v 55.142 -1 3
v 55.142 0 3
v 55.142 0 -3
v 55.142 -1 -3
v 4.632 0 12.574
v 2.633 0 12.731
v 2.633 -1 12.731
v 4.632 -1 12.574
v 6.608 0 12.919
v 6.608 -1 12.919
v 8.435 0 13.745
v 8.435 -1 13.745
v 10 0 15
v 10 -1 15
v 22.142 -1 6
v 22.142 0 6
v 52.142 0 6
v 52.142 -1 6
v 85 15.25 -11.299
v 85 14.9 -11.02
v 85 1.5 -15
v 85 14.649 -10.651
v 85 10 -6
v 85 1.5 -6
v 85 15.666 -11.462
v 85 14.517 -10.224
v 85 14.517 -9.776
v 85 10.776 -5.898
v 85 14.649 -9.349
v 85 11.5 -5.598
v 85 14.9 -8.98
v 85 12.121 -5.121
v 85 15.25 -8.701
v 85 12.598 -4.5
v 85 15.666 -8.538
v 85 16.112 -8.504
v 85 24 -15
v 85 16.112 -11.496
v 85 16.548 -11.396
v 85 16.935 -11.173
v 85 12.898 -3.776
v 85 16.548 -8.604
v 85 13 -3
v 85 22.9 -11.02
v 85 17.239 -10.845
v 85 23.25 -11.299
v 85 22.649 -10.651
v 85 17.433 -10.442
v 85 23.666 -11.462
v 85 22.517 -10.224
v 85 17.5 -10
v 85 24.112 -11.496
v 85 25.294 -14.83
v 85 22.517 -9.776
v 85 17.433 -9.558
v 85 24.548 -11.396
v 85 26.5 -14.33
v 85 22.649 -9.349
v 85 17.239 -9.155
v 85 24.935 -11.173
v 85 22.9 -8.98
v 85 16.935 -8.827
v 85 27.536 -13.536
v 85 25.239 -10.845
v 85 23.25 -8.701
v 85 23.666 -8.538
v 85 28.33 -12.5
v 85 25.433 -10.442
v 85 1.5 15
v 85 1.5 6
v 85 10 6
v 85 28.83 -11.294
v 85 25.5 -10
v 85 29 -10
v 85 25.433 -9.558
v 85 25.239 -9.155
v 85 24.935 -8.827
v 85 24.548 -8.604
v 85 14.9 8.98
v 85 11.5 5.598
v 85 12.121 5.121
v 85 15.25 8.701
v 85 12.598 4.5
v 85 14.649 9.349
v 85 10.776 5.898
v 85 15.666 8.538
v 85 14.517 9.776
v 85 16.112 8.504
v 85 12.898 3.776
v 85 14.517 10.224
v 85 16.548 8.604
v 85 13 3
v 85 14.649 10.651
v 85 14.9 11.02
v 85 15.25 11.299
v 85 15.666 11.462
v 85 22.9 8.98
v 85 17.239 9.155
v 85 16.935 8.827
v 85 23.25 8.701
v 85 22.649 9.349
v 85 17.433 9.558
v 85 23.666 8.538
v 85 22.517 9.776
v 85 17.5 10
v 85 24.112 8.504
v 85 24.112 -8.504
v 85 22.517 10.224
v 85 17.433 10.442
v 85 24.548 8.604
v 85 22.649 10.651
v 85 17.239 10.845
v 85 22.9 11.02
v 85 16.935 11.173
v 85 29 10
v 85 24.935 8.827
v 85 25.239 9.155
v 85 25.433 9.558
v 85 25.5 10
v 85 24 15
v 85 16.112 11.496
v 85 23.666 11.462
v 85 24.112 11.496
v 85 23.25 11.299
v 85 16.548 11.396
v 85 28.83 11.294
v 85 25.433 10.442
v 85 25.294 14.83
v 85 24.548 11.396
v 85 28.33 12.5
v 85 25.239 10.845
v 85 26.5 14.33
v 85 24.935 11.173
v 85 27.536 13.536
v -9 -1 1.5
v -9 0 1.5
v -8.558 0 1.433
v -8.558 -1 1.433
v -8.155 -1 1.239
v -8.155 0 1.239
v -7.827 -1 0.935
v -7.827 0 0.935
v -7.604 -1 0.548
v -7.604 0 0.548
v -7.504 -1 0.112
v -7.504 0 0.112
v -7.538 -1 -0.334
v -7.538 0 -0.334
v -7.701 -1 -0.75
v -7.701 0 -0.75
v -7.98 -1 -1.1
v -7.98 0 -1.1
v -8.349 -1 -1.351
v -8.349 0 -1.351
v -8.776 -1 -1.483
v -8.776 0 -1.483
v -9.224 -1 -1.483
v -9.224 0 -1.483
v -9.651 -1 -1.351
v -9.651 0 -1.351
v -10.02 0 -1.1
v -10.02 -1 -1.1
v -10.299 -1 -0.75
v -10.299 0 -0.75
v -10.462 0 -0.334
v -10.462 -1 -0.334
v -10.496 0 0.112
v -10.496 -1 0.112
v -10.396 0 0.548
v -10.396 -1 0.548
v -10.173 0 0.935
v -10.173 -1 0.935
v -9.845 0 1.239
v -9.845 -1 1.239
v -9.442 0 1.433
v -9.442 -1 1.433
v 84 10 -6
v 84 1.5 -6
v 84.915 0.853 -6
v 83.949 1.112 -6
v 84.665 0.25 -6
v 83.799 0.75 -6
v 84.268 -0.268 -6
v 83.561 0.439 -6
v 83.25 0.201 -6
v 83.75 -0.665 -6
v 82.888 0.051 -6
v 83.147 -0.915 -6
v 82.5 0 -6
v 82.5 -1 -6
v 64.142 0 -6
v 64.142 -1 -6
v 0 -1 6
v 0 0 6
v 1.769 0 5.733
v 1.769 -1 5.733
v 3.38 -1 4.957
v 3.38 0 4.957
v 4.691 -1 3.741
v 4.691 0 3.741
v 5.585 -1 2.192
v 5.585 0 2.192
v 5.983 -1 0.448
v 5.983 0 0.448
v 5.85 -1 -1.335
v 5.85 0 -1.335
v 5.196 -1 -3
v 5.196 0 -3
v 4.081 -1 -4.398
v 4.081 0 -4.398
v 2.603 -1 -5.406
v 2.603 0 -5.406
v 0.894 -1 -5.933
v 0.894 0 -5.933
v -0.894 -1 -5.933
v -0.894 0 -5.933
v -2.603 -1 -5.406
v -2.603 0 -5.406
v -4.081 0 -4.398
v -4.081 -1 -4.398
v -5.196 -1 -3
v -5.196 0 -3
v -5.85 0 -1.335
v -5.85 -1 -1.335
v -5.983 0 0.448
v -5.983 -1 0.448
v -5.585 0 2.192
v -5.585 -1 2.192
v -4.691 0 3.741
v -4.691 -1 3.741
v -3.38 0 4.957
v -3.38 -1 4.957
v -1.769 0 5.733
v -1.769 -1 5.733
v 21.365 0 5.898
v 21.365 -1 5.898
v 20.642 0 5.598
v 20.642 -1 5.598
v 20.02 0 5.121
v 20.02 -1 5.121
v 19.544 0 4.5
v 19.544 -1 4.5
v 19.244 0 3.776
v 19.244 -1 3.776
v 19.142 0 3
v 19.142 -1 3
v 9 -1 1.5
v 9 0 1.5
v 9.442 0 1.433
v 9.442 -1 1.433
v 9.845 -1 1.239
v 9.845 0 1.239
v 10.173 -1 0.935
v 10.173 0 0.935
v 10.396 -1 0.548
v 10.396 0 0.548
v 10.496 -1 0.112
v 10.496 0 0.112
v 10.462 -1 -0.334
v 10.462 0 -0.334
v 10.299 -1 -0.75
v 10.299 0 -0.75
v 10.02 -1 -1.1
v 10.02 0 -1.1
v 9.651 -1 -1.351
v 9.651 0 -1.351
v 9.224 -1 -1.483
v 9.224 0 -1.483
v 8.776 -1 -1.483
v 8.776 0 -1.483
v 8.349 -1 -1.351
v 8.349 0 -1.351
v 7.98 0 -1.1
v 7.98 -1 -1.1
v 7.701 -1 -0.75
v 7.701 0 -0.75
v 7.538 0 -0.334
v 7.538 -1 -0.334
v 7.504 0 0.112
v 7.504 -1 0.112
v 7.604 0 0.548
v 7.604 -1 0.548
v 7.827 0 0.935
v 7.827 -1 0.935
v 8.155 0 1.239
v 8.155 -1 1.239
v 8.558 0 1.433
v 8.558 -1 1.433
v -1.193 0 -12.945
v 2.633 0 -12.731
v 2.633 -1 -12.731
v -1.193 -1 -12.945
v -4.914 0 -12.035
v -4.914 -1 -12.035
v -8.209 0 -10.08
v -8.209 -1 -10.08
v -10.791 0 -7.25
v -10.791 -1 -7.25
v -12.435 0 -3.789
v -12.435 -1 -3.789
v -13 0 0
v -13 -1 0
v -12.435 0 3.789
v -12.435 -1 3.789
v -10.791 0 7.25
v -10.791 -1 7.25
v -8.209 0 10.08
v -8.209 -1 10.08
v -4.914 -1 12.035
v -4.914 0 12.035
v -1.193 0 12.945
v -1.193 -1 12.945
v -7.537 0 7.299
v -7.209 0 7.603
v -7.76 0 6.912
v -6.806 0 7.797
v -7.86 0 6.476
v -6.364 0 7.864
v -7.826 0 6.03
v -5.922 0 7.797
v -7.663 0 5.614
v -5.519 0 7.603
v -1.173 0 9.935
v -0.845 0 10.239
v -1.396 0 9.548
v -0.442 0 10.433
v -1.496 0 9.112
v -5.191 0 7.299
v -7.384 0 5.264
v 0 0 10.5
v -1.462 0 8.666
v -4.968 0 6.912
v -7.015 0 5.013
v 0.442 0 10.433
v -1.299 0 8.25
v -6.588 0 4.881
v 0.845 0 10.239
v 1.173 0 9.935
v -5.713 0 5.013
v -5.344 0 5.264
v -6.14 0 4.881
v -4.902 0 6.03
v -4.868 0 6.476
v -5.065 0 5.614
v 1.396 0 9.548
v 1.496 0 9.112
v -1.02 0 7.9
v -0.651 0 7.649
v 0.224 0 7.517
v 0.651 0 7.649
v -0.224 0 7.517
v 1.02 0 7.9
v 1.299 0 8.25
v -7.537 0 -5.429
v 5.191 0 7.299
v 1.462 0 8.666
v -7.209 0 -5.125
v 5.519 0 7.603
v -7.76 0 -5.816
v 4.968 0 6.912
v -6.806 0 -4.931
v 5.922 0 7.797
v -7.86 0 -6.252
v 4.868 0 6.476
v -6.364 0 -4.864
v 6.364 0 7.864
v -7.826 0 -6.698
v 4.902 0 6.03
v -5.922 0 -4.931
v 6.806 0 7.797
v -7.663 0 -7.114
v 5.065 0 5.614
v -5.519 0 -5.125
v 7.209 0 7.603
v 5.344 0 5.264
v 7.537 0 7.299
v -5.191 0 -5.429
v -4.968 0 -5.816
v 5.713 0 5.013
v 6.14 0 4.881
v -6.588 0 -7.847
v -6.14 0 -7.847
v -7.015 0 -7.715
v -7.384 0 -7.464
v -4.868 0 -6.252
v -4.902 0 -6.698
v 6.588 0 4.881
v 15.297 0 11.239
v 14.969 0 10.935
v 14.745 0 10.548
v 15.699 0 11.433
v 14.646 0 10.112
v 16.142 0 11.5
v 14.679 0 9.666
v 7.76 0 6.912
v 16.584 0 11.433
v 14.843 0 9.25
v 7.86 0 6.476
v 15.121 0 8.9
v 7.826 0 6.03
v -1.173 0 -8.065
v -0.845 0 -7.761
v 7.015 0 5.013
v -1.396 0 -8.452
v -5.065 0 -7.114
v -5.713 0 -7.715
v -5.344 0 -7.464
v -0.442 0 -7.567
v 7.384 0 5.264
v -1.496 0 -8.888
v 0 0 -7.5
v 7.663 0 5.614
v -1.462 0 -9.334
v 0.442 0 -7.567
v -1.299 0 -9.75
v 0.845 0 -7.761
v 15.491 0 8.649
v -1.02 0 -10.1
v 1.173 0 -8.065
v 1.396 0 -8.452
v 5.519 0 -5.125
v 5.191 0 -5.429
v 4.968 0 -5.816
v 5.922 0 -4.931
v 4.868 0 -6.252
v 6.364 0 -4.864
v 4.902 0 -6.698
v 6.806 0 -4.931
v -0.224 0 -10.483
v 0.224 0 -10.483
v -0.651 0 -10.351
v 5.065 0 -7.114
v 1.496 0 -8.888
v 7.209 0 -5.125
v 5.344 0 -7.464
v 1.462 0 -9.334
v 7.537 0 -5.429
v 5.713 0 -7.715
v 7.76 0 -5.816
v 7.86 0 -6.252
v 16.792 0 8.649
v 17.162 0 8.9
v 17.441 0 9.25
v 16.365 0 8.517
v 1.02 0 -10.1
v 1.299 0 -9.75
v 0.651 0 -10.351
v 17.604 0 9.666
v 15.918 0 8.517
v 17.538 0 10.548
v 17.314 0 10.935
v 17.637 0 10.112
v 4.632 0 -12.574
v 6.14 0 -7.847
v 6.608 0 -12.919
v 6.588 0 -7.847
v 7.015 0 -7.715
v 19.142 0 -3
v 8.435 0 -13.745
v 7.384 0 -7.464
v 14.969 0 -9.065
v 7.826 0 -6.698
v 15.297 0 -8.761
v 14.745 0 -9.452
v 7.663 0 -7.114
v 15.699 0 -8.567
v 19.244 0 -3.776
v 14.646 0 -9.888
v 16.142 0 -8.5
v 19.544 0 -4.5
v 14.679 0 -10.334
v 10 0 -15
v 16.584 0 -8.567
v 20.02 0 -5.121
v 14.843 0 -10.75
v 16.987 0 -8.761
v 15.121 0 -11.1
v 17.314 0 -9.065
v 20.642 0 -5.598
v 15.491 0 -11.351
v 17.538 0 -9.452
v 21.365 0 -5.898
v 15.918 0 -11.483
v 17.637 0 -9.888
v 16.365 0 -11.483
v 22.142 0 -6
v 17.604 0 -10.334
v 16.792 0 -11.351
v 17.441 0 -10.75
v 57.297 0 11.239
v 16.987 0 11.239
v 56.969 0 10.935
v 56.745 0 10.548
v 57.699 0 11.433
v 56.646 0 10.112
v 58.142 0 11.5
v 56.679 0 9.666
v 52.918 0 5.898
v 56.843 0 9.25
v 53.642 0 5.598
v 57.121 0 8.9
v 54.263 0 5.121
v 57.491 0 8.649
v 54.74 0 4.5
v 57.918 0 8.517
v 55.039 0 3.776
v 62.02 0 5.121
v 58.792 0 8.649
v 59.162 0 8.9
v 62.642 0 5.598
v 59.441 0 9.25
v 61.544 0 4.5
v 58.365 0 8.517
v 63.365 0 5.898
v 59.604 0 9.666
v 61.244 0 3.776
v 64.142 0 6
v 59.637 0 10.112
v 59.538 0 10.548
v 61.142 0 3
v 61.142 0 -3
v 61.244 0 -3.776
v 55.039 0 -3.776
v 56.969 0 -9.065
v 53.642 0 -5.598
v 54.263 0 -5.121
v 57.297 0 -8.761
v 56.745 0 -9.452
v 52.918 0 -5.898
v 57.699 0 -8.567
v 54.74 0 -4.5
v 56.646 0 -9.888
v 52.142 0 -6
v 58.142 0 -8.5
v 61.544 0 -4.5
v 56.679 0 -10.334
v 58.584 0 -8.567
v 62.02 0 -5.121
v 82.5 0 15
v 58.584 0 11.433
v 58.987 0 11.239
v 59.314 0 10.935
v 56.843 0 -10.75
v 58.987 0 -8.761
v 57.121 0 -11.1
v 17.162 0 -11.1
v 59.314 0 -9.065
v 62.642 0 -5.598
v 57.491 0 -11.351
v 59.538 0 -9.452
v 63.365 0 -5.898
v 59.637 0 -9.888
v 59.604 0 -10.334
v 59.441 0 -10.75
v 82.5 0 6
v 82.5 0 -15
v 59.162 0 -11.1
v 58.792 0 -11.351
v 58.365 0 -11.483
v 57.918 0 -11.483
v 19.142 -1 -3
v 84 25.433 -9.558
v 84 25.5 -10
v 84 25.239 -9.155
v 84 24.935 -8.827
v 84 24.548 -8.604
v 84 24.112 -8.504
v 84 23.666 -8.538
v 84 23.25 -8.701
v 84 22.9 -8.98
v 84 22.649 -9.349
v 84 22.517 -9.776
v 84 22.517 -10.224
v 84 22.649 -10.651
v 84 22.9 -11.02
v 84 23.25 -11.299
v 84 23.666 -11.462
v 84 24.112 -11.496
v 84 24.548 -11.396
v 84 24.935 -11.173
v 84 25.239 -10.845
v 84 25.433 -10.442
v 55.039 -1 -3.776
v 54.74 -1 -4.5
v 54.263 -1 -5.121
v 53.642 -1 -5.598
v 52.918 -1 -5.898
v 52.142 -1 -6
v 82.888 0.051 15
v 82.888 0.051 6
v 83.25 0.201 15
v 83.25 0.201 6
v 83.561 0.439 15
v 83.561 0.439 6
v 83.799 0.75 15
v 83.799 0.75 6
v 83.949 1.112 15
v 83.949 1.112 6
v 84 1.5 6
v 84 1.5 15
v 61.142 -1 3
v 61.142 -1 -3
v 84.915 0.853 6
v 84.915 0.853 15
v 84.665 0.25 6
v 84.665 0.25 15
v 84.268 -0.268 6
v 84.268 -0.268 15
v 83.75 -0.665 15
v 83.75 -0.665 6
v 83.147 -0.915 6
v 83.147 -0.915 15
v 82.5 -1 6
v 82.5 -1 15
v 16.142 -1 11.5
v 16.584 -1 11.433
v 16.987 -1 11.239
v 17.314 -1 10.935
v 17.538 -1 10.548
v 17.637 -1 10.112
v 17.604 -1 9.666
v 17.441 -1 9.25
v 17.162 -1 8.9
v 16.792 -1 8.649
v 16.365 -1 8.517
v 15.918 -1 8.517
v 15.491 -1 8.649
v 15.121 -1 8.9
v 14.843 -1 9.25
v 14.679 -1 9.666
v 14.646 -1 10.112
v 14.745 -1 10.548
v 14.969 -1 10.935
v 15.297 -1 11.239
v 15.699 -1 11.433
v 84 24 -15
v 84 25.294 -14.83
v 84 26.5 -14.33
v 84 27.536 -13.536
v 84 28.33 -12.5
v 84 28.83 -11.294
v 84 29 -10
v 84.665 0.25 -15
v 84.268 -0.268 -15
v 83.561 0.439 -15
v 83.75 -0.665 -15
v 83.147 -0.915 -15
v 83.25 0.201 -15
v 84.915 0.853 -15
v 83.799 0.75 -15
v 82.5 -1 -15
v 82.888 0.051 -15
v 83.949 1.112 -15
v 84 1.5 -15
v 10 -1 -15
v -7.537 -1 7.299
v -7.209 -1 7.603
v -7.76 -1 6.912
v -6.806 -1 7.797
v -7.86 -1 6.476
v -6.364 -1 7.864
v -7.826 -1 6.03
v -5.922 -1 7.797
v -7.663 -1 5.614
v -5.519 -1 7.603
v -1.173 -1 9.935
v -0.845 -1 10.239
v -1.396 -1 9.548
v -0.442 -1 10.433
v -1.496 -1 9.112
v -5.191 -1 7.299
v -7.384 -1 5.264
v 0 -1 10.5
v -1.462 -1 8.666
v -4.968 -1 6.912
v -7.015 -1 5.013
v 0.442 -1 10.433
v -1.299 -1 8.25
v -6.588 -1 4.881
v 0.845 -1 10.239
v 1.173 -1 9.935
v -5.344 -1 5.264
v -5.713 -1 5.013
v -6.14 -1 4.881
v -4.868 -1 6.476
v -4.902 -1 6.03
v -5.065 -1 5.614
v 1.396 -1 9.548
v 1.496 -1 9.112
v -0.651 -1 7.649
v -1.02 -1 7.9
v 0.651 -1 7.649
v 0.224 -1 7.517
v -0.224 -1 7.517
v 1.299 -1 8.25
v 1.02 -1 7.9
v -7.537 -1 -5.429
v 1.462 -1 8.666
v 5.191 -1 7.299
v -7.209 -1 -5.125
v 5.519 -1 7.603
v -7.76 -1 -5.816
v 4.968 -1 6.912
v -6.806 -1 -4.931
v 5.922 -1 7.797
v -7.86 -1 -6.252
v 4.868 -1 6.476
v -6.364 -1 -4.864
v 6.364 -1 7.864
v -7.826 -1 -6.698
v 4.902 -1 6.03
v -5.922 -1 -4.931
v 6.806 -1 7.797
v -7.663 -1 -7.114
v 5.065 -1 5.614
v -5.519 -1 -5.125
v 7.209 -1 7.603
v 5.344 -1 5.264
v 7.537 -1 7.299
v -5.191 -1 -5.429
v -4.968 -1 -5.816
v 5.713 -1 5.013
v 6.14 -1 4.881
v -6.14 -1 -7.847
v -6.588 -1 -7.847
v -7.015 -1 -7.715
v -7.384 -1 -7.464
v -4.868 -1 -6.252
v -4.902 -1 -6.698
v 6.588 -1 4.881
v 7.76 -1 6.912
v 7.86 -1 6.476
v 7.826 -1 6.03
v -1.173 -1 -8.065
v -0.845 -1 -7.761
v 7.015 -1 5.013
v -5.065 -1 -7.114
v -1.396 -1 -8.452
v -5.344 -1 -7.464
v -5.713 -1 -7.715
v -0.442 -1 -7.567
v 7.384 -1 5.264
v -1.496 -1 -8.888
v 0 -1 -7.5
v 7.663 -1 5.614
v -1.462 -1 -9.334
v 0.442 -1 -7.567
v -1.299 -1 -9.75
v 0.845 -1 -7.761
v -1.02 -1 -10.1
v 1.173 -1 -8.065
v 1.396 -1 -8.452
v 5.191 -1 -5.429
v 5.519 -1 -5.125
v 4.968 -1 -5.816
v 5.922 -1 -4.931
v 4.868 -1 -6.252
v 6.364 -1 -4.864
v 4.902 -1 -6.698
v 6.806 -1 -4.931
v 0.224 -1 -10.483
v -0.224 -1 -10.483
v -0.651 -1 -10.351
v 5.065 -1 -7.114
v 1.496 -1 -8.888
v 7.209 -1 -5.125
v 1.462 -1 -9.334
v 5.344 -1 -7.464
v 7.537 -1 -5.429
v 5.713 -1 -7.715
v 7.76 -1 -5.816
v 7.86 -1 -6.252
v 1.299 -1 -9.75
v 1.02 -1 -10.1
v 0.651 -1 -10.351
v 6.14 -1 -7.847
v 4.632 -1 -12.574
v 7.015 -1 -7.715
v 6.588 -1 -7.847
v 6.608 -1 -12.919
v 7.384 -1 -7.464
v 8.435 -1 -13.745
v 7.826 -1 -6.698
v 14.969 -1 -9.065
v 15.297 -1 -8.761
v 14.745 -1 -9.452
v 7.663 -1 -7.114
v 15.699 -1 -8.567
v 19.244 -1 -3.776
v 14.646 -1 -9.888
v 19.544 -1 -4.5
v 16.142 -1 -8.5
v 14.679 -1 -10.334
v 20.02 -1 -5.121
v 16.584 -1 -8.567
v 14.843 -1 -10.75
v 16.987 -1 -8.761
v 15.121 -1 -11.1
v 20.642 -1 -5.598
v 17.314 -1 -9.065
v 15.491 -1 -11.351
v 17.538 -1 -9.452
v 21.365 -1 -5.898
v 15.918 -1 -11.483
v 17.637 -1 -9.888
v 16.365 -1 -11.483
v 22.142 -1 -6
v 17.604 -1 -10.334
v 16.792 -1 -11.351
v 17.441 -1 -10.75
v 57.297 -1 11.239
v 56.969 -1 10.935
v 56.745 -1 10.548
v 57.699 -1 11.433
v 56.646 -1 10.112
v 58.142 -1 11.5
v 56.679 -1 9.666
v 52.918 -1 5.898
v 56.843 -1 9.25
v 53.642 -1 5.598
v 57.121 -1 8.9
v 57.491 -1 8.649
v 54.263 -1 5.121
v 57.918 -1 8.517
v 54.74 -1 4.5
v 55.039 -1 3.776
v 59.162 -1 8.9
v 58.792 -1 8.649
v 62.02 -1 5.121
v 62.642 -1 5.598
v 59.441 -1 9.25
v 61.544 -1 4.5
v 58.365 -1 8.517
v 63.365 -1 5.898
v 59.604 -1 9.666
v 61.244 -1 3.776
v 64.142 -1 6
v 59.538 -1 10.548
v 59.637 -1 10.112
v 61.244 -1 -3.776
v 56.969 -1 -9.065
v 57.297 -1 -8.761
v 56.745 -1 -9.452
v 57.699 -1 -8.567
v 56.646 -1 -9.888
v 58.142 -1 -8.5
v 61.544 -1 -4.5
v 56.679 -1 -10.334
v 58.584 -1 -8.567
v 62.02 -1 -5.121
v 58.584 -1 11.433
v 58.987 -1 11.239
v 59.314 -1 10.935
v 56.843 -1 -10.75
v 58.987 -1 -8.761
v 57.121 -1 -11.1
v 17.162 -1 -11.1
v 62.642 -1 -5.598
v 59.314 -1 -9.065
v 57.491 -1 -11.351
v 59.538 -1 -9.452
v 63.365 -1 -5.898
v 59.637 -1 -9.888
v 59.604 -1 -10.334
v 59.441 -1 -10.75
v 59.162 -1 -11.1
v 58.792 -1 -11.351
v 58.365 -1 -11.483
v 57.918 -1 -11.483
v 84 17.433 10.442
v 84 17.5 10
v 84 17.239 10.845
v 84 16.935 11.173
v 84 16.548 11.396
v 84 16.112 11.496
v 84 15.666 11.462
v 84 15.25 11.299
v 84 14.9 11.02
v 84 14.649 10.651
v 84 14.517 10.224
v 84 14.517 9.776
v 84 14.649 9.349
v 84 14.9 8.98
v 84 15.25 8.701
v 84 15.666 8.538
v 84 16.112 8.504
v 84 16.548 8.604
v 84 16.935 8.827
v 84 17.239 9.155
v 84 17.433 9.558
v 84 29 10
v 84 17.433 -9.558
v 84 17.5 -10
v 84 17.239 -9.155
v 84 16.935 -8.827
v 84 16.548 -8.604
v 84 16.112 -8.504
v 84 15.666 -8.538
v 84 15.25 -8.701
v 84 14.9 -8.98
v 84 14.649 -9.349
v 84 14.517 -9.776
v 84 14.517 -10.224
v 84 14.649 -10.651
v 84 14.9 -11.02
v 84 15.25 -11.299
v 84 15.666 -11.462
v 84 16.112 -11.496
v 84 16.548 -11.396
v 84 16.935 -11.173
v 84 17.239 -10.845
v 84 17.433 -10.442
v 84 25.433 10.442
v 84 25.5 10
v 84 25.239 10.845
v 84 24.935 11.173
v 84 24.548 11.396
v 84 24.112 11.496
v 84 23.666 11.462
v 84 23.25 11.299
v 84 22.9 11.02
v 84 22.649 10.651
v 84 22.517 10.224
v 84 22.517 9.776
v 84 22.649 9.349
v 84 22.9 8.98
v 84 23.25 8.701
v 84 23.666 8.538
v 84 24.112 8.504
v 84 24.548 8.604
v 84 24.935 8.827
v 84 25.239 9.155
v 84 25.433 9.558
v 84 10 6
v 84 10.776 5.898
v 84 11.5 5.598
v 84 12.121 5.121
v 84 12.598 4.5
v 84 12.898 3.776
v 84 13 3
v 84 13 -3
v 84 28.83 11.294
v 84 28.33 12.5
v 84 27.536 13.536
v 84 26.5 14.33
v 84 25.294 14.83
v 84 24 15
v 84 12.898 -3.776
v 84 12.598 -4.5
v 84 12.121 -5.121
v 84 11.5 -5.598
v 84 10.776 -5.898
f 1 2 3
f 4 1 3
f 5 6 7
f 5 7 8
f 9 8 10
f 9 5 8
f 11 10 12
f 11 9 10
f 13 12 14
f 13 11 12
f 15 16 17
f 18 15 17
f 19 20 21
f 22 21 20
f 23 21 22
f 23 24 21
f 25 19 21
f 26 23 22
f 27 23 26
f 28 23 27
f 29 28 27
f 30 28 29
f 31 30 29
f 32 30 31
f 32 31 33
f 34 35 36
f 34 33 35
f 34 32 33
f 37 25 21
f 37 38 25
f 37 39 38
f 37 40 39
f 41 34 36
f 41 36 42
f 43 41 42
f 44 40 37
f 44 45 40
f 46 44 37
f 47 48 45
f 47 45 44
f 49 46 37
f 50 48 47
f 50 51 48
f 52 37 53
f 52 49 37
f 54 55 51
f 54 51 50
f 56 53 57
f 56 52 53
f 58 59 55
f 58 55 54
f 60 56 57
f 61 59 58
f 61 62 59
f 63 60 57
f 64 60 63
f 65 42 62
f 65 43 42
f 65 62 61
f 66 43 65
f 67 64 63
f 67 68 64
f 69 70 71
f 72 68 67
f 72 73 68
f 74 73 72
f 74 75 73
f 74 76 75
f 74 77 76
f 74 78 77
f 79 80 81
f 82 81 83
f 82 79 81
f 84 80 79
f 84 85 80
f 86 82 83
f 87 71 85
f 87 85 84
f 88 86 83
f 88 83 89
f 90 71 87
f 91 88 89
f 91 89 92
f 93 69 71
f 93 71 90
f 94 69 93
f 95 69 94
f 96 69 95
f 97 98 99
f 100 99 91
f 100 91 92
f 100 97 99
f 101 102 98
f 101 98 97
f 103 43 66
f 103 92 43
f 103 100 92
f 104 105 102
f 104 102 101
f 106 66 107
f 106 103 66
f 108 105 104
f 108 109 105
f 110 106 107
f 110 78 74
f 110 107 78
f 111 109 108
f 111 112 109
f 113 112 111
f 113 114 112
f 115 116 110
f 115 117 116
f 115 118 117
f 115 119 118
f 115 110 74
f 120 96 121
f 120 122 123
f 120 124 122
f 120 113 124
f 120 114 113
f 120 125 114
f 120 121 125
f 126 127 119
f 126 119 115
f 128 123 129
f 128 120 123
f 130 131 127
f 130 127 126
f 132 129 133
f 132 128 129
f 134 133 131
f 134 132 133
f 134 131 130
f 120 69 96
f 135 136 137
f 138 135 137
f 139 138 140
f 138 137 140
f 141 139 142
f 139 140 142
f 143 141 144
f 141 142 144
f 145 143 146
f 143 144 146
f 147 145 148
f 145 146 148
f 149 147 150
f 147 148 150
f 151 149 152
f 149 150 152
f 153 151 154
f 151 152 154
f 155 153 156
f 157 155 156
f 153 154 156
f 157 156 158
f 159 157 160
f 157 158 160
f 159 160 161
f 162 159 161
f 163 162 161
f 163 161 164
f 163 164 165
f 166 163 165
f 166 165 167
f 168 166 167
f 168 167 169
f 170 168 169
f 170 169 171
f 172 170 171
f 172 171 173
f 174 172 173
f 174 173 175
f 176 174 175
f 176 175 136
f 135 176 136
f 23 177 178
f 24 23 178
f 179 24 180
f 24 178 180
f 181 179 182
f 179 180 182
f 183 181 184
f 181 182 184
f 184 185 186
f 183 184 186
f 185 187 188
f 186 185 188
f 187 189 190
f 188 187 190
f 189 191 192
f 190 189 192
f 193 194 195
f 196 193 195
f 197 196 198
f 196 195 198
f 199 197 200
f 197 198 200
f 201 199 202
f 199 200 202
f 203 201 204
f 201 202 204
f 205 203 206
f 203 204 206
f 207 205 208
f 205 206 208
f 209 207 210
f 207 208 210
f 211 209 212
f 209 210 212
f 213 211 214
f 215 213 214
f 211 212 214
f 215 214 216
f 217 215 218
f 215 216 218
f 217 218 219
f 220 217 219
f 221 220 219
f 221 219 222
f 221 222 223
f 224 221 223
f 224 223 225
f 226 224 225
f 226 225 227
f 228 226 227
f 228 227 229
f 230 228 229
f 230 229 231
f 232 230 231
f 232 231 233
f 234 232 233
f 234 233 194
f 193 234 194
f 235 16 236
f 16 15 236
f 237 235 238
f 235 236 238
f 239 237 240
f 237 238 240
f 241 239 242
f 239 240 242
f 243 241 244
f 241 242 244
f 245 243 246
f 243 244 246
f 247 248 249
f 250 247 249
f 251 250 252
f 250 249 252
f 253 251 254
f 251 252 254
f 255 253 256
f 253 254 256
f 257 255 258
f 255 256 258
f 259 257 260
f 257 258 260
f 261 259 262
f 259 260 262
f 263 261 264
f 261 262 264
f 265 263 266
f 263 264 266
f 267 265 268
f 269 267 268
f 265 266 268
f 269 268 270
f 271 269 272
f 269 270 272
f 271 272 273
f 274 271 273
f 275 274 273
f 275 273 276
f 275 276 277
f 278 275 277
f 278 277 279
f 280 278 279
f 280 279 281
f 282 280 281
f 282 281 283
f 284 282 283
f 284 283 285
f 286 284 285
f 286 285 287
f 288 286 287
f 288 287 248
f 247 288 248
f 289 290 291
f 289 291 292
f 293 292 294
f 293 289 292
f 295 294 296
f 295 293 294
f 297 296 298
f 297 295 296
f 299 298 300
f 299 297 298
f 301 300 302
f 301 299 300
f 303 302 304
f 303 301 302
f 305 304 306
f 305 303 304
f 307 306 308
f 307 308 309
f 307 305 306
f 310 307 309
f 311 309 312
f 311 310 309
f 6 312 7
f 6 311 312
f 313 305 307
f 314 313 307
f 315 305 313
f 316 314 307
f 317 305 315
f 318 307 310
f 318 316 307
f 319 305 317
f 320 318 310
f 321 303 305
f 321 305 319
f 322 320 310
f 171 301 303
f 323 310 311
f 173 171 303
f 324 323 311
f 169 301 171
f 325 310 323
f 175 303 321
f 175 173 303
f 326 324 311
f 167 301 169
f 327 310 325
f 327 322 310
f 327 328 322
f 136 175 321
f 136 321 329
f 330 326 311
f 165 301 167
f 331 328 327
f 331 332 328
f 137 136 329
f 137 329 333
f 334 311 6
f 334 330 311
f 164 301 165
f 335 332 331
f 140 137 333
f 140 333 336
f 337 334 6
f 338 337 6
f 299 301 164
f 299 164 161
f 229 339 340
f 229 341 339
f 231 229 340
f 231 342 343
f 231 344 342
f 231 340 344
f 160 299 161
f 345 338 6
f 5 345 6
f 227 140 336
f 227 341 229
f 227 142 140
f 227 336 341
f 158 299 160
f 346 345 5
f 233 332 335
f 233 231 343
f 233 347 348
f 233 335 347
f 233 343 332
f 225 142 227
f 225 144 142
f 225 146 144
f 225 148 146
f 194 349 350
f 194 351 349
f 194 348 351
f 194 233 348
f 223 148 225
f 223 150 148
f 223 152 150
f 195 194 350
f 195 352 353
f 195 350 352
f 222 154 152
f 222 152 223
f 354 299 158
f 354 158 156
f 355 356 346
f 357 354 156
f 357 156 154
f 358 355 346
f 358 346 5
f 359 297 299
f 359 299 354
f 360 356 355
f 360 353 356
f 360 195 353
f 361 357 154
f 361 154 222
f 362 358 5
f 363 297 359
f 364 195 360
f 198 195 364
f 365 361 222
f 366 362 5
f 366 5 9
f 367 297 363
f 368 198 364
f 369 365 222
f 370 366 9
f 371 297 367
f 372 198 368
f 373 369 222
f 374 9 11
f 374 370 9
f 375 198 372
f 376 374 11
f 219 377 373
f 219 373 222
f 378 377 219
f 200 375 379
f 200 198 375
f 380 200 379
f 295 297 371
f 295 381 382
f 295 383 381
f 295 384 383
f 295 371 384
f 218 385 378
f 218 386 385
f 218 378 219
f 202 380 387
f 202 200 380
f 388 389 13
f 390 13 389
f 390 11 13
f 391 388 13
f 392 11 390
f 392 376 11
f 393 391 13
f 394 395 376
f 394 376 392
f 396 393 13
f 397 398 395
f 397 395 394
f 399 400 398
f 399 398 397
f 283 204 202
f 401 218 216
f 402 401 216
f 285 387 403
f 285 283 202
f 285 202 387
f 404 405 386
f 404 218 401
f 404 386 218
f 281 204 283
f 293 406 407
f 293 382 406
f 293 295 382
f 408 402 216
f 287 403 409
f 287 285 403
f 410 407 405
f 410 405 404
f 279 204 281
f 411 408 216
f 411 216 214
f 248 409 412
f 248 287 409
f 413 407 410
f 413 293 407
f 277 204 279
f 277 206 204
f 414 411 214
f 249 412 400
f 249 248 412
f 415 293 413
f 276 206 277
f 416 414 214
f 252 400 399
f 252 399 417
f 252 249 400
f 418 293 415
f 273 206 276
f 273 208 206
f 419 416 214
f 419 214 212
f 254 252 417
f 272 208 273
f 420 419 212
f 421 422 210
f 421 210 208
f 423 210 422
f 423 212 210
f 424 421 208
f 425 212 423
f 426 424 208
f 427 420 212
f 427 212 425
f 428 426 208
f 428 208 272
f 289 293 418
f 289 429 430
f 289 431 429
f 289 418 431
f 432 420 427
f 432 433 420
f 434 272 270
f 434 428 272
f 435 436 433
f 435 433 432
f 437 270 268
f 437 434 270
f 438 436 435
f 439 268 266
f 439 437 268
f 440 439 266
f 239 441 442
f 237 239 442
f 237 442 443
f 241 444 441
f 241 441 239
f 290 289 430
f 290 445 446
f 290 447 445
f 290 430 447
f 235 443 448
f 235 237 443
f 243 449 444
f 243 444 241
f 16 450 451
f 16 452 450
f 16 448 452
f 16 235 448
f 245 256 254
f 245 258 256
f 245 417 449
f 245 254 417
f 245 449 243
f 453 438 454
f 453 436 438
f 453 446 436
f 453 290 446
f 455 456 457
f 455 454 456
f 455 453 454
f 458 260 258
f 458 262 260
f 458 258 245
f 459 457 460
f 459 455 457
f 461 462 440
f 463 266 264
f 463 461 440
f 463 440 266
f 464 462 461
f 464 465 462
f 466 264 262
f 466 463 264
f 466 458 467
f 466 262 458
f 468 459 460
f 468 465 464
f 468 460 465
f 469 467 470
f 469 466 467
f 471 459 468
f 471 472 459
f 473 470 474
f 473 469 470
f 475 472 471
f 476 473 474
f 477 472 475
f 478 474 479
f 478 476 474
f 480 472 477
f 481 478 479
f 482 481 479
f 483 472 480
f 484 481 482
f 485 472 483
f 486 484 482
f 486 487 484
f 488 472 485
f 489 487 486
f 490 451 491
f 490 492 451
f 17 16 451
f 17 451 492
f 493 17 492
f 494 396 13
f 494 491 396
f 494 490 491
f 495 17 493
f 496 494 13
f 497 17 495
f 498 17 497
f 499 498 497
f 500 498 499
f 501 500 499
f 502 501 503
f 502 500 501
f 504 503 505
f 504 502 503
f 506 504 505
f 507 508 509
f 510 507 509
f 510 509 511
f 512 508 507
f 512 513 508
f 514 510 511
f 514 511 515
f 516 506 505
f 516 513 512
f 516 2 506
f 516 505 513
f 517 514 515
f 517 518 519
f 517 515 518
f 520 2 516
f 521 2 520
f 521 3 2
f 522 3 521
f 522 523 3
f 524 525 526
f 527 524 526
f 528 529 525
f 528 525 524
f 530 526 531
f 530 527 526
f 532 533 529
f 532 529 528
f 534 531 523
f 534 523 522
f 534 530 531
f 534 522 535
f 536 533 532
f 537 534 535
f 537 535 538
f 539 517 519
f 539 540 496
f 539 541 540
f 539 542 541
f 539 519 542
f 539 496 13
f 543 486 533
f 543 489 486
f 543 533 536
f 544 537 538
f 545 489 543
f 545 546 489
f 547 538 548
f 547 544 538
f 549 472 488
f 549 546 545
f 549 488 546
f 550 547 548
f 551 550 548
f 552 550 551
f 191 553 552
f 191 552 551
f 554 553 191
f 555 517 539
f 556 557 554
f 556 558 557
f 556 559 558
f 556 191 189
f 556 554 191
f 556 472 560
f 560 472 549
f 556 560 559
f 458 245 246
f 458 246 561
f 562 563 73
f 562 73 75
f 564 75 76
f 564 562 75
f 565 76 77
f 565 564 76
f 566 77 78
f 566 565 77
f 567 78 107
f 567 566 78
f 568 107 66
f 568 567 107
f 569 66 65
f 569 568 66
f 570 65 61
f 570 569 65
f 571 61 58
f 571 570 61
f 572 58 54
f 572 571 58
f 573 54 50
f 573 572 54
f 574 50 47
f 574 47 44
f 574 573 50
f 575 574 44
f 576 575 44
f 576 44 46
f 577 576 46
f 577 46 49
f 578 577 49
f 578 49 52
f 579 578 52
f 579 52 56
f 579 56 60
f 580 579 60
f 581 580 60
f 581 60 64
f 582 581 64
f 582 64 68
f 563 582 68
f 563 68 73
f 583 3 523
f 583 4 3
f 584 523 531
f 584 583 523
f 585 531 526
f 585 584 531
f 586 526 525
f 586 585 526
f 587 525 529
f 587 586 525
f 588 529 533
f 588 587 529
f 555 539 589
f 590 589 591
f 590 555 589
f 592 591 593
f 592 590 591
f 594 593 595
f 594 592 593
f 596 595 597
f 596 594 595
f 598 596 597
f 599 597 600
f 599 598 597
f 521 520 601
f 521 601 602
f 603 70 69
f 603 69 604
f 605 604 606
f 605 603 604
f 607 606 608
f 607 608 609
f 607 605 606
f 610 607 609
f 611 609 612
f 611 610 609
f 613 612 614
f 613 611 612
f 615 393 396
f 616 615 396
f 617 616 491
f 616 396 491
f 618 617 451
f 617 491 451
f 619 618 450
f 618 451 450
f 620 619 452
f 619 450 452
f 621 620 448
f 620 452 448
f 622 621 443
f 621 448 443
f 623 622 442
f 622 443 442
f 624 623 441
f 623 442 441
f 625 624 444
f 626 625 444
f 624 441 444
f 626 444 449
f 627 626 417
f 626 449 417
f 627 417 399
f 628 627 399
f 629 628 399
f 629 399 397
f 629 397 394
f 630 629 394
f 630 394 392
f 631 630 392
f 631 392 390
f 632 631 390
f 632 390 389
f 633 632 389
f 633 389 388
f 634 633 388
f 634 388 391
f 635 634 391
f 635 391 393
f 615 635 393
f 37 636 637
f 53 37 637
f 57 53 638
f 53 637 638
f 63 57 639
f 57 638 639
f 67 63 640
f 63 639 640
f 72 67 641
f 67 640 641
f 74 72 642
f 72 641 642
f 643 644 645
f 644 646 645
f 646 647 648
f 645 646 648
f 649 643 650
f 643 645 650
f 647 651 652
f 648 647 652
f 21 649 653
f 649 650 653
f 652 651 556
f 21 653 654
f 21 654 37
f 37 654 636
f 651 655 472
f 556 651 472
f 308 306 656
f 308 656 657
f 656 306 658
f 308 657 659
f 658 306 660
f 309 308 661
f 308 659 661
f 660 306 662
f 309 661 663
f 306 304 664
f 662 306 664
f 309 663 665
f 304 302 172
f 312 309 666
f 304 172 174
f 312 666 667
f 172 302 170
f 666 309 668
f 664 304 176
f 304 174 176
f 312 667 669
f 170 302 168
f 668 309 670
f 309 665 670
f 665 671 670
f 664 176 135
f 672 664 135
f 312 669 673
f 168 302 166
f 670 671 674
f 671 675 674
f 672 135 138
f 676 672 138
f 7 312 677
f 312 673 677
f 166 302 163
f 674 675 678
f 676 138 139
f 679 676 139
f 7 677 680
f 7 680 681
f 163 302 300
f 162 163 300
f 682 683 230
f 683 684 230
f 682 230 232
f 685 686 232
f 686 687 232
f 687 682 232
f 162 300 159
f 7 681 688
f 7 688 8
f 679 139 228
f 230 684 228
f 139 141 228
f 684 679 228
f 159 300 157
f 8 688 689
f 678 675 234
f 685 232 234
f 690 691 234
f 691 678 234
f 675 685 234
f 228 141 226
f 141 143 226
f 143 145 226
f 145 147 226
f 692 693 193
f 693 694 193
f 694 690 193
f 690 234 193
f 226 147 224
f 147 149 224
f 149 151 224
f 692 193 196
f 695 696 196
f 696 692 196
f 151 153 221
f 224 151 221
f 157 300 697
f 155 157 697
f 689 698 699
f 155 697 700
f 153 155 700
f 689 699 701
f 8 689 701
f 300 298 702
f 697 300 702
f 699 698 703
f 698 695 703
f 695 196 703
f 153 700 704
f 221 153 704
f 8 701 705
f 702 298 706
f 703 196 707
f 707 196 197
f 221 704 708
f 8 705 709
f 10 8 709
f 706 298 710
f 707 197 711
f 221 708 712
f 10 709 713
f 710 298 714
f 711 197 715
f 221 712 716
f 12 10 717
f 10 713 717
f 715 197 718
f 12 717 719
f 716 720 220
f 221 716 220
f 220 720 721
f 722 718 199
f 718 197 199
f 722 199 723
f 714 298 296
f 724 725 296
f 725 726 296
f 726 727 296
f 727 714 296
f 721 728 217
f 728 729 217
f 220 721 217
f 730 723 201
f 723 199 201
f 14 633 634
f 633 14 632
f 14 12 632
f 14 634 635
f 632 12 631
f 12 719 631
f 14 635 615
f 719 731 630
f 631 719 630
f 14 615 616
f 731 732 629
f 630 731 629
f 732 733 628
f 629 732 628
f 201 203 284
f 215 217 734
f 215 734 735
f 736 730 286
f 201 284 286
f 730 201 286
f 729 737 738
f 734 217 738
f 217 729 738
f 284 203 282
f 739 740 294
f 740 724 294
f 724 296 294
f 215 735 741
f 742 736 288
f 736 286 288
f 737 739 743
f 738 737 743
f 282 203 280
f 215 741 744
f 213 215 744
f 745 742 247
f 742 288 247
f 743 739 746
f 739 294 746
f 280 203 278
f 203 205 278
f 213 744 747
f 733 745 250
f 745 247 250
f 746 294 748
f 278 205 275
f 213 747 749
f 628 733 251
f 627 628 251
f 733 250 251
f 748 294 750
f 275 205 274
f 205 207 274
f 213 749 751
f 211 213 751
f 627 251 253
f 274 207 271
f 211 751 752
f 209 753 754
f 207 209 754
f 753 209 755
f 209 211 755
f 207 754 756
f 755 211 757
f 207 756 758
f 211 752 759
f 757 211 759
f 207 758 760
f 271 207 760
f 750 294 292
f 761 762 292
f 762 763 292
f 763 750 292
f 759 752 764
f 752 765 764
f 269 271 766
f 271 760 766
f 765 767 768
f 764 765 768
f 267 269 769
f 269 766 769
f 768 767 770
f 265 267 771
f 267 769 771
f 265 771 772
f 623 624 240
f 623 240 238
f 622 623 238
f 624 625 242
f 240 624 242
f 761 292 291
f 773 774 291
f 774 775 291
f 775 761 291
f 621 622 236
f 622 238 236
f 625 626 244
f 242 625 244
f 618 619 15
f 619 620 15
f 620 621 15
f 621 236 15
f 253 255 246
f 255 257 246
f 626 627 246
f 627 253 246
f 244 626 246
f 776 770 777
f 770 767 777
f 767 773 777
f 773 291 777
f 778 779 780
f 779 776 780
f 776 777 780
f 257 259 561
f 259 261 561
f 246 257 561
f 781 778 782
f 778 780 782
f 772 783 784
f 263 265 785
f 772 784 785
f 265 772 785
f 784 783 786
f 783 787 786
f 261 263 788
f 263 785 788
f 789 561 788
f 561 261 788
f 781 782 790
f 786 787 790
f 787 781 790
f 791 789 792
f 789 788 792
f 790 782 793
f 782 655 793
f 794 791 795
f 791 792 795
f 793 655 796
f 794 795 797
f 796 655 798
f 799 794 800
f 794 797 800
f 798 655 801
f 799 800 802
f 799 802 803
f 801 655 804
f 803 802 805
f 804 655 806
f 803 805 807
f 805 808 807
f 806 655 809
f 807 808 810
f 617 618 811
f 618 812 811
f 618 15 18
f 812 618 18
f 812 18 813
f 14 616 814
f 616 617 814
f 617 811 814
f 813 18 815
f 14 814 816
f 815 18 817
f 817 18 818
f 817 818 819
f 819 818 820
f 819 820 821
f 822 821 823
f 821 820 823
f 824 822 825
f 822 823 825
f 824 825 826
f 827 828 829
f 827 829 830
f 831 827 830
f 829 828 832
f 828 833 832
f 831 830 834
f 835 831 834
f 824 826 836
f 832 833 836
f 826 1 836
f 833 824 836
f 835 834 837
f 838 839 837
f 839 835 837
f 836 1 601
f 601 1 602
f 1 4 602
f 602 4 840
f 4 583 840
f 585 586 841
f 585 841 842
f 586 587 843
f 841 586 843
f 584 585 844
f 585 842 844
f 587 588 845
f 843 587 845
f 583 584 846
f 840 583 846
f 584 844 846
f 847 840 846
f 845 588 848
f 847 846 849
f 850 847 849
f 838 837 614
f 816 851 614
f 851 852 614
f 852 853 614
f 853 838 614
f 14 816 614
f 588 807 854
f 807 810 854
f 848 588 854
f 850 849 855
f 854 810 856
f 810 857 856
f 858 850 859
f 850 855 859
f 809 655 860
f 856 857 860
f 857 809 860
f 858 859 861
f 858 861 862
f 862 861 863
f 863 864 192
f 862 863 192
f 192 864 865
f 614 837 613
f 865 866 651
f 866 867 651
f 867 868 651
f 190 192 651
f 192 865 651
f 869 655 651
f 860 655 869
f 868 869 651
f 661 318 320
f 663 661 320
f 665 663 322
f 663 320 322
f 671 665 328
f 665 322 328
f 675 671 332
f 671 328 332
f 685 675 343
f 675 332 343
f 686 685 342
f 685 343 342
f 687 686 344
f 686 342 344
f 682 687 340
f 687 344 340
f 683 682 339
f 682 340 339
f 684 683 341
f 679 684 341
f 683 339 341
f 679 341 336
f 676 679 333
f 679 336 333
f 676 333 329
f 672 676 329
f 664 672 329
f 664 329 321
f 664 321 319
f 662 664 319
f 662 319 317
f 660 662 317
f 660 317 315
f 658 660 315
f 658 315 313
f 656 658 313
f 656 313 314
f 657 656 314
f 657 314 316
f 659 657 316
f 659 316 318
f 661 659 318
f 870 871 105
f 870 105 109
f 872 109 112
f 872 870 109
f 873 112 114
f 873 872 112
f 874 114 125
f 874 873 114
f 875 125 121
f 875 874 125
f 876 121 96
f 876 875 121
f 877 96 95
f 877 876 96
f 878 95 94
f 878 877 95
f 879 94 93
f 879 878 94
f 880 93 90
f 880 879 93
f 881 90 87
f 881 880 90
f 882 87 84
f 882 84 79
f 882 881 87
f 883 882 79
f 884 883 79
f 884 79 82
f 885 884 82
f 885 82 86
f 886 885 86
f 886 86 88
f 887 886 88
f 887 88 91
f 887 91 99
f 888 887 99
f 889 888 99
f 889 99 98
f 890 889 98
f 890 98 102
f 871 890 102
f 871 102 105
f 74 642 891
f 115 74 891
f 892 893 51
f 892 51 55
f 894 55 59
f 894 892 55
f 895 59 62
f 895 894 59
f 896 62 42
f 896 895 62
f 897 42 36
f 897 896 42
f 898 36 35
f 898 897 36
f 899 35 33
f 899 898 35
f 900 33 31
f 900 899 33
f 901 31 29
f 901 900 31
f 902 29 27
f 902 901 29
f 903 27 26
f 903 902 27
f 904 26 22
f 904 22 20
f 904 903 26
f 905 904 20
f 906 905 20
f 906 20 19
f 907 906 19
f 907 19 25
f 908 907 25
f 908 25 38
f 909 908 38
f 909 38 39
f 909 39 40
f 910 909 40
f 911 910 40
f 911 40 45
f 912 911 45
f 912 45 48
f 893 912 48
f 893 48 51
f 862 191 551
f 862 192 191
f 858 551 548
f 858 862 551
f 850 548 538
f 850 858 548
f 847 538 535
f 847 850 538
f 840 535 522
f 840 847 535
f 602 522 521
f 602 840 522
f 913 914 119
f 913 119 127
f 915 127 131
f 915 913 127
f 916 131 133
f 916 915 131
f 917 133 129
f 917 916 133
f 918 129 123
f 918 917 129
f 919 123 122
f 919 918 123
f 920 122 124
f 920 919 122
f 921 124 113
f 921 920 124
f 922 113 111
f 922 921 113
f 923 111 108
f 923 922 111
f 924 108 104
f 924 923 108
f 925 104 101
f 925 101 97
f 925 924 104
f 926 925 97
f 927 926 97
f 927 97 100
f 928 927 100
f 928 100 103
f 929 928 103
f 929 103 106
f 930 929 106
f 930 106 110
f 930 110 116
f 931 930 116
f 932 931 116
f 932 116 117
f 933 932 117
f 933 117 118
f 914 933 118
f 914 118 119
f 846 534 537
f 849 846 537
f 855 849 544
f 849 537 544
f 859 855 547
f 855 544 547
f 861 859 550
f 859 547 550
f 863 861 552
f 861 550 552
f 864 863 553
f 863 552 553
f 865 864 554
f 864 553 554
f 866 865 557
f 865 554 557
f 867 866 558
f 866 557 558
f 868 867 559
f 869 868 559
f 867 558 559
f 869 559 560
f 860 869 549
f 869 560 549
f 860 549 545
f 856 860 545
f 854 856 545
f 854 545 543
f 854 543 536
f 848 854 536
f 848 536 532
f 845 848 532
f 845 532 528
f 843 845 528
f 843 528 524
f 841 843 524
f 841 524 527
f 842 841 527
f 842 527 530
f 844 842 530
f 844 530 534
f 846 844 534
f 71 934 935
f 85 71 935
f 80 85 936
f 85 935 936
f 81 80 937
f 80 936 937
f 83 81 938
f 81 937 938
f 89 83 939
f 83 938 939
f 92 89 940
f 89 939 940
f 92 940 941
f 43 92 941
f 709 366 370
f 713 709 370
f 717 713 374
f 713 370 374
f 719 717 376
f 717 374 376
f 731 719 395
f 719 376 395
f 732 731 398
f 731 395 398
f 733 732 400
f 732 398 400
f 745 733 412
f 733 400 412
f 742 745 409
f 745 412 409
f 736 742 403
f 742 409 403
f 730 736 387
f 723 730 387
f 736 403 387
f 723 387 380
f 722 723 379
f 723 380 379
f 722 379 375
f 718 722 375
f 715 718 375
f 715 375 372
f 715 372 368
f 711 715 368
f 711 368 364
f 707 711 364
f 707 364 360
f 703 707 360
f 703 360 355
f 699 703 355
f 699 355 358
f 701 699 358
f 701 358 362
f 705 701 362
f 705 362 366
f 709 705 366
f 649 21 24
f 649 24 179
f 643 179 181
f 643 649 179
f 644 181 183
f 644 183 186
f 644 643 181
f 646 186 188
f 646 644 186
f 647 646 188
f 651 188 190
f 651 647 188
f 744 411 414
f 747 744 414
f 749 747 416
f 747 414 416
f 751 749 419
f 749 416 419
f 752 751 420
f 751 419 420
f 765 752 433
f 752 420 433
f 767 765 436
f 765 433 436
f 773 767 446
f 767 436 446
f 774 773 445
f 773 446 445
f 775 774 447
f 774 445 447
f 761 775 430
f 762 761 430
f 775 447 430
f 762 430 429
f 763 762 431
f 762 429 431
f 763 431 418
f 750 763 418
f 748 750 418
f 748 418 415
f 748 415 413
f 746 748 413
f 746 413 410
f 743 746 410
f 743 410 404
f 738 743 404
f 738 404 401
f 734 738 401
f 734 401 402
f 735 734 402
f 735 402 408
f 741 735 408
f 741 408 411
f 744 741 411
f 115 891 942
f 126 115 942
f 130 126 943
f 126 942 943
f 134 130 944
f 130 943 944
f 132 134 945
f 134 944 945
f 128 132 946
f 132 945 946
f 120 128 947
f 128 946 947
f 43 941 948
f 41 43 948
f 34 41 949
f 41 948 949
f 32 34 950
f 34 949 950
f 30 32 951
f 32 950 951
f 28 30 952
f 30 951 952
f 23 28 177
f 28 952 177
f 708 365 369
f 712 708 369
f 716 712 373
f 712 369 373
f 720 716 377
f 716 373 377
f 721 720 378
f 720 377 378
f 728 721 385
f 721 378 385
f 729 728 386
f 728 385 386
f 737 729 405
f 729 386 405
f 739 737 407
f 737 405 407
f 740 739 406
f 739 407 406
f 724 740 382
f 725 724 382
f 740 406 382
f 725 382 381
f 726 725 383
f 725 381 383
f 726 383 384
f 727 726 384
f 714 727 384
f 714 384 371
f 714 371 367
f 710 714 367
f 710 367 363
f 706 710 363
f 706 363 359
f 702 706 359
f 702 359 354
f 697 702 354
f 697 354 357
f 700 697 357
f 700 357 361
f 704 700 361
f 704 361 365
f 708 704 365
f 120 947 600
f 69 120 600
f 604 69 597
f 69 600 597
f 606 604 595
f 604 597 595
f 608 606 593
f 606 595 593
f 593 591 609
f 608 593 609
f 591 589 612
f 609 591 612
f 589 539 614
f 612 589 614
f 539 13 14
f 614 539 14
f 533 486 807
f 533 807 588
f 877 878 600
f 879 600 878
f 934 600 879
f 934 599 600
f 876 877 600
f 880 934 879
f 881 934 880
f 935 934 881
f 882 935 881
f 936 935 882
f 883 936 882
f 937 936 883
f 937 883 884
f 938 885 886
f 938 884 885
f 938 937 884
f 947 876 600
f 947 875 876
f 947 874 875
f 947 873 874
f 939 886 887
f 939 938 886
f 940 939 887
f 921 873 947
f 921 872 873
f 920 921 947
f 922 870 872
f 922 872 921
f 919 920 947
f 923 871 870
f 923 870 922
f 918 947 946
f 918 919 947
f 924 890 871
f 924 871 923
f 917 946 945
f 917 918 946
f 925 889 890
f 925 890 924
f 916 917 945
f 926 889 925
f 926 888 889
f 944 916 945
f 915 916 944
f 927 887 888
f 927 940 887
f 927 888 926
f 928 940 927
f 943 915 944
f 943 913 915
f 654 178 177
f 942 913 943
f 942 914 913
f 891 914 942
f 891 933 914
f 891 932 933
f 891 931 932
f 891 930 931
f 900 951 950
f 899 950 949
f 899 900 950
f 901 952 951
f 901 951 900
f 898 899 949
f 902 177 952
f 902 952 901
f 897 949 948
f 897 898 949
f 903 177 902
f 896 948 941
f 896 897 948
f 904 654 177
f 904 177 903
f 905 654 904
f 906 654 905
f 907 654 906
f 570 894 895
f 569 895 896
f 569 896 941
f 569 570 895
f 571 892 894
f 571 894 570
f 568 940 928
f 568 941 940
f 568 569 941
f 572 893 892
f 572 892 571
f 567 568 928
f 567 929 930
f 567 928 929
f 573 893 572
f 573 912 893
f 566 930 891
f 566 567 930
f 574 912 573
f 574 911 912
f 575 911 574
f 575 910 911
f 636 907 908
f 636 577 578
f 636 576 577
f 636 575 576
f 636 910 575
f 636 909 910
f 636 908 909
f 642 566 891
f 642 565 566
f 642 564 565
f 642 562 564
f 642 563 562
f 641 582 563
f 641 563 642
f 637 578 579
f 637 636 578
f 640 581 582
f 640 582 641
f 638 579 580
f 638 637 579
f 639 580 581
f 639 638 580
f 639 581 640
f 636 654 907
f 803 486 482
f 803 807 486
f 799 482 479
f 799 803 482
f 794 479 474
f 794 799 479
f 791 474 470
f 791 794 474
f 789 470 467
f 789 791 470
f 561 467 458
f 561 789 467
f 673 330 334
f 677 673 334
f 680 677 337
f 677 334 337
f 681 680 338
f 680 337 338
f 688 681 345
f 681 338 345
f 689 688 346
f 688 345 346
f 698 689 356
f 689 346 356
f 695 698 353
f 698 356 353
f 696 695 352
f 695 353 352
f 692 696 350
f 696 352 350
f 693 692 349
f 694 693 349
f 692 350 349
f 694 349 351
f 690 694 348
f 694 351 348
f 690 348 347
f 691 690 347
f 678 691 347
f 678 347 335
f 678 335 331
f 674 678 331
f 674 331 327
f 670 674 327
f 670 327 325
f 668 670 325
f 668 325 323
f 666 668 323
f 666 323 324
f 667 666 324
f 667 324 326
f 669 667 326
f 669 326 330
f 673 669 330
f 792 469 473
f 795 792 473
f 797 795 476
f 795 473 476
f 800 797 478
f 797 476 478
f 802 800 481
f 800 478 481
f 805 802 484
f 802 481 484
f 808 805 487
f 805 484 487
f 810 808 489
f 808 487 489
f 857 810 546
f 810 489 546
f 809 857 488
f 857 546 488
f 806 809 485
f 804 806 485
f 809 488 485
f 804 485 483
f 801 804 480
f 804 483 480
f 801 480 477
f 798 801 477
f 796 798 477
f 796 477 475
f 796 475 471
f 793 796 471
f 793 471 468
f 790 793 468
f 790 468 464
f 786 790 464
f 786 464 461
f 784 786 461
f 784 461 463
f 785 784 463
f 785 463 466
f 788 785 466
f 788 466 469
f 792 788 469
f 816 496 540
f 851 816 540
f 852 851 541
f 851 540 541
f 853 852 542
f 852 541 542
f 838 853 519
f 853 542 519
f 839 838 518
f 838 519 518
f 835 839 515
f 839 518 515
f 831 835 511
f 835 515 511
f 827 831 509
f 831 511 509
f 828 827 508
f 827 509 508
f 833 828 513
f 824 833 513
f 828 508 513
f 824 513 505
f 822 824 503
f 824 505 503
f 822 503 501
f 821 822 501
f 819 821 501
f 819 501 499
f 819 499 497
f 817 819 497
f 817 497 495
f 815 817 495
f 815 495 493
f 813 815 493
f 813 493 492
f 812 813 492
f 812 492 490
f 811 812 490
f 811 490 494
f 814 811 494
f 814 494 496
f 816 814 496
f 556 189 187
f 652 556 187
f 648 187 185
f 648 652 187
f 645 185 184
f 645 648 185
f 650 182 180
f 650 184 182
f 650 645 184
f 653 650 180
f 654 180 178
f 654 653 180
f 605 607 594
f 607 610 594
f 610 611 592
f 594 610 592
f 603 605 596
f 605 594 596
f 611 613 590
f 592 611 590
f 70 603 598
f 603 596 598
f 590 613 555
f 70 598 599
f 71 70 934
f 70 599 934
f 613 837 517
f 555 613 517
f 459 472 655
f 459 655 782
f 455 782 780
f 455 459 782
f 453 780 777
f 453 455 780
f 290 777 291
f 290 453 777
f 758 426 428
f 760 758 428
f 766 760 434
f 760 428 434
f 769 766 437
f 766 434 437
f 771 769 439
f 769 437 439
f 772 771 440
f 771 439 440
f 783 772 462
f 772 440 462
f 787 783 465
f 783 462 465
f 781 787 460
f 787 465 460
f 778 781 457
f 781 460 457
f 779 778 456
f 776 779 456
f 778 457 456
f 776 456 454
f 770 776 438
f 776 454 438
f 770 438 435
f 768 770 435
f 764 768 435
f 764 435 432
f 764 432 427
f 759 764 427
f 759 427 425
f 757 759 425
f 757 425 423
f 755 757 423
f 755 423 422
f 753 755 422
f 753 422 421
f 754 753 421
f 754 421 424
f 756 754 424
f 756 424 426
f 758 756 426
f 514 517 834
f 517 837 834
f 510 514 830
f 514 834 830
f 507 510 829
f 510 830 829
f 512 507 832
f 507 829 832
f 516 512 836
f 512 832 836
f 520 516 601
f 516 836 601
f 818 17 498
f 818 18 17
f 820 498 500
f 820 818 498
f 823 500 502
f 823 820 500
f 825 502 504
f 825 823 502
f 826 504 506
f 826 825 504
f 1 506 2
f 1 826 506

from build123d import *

# Parameters (mm, degrees)
BASE_FLANGE1_DEPTH           = 1
EDGE_FLANGE1_STRIP_W         = 7
EDGE_FLANGE1_STRIP_H         = 1
EDGE_FLANGE1_STRIP_CUT_DEPTH = 30
EDGE_FLANGE1_DEPTH           = 30
FILLET1_R                    = 5
UNFOLD1_OUTLINE_W            = 3.141592654
UNFOLD1_OUTLINE_H            = 30
UNFOLD1_DEPTH                = 29
UNFOLD1_START                = -1
UNFOLD1_2_DEPTH              = 1
SKETCH10_R                   = 6
SKETCH10_R_2                 = 1.5
SKETCH10_W                   = 36
SKETCH10_H                   = 12
CUT_EXTRUDE1_DEPTH           = 10
FILLET2_R                    = 3
FOLD1_START                  = 84.74315
FOLD1_OUTLINE_W              = 1
FOLD1_OUTLINE_H              = 30
FOLD1_DEPTH                  = 28.398442654
FOLD1_START_2                = 82.5
FOLD1_2_OUTLINE_R            = 1.5
FOLD1_2_DEPTH                = 2.5
FOLD1_START_3                = -16
FOLD1_3_DEPTH                = 31


with BuildPart() as part:
    # Base-Flange1: sheet metal written as solids
    # Sketch1 → Base-Flange1 (new body)
    with BuildSketch(Plane(origin=(0, 0, 0), x_dir=(1, 0, 0), z_dir=(0, 1, 0))):
        with BuildLine():
            Line((10, -15), (85, -15))
            Line((85, -15), (85, 15))
            Line((85, 15), (10, 15))
            ThreePointArc((10, 15), (6.607674197, 12.919380101), (2.632597571, 12.730649238))
            ThreePointArc((2.632597571, 12.730649238), (-13, 0), (2.632597571, -12.730649238))
            ThreePointArc((2.632597571, -12.730649238), (6.607674197, -12.919380101), (10, -15))
        make_face()
    extrude(amount=-BASE_FLANGE1_DEPTH)

    # Edge-Flange1: sheet metal written as solids
    # Edge-Flange1 strip (on a plane across the edge) → Edge-Flange1 strip cut (cut)
    with BuildSketch(Plane(origin=(85, 0, 15), x_dir=(-1, 0, 0), z_dir=(0, 0, -1))):
        with Locations((-1, -0.5)):
            Rectangle(EDGE_FLANGE1_STRIP_W, EDGE_FLANGE1_STRIP_H)
    extrude(amount=EDGE_FLANGE1_STRIP_CUT_DEPTH, mode=Mode.SUBTRACT)

    # Edge-Flange1 section (on a plane across the edge) → Edge-Flange1 (add)
    with BuildSketch(Plane(origin=(85, 0, 15), x_dir=(-1, 0, 0), z_dir=(0, 0, -1))):
        with BuildLine():
            Line((0, 1.5), (0, 29))
            Line((0, 29), (1, 29))
            Line((1, 29), (1, 1.5))
            ThreePointArc((1, 1.5), (1.439339828, 0.439339828), (2.5, 0))
            Line((2.5, 0), (2.5, -1))
            ThreePointArc((2.5, -1), (0.732233047, -0.267766953), (0, 1.5))
        make_face()
    extrude(amount=EDGE_FLANGE1_DEPTH)

    # Fillet1
    fillet1_edges = [part.edges().sort_by_distance(p)[0] for p in [
        (84.5, 29, 15),
        (84.5, 29, -15),
    ]]
    fillet(fillet1_edges, radius=FILLET1_R)

    # Unfold1: read off the stored shape, not the designer's step
    # Unfold1 outline → Unfold1 (cut)
    with BuildSketch(Plane(origin=(0, 0, 0), x_dir=(1, 0, 0), z_dir=(0, 1, 0))):
        with Locations((84.070796327, 0)):
            Rectangle(UNFOLD1_OUTLINE_W, UNFOLD1_OUTLINE_H)
    extrude(amount=UNFOLD1_DEPTH, mode=Mode.SUBTRACT)

    # Unfold1 2 outline → Unfold1 2 (add)
    with BuildSketch(Plane(origin=(0, 0, 0), x_dir=(1, 0, 0), z_dir=(0, 1, 0)).offset(UNFOLD1_START)):
        with BuildLine():
            Line((108.141592654, 15), (82.5, 15))
            Line((82.5, 15), (82.5, -15))
            Line((82.5, -15), (108.141592654, -15))
            ThreePointArc((108.141592654, -15), (111.67712656, -13.535533906), (113.141592654, -10))
            Line((113.141592654, -10), (113.141592654, 10))
            ThreePointArc((113.141592654, 10), (111.67712656, 13.535533906), (108.141592654, 15))
        make_face()
    extrude(amount=UNFOLD1_2_DEPTH)

    # Sketch10 → Cut-Extrude1 (cut)
    with BuildSketch(Plane(origin=(0, 0, 0), x_dir=(1, 0, 0), z_dir=(0, 1, 0))):
        with Locations(Location((0, 0, 0), (0, 0, 270))):
            Circle(SKETCH10_R)
        with Locations(Location((0, 9, 0), (0, 0, 270))):
            Circle(SKETCH10_R_2)
        with Locations(Location((6.363961031, 6.363961031, 0), (0, 0, 270))):
            Circle(SKETCH10_R_2)
        with Locations(Location((9, 0, 0), (0, 0, 270))):
            Circle(SKETCH10_R_2)
        with Locations(Location((6.363961031, -6.363961031, 0), (0, 0, 270))):
            Circle(SKETCH10_R_2)
        with Locations(Location((0, -9, 0), (0, 0, 270))):
            Circle(SKETCH10_R_2)
        with Locations(Location((-6.363961031, -6.363961031, 0), (0, 0, 270))):
            Circle(SKETCH10_R_2)
        with Locations(Location((-9, 0, 0), (0, 0, 270))):
            Circle(SKETCH10_R_2)
        with Locations(Location((-6.363961031, 6.363961031, 0), (0, 0, 270))):
            Circle(SKETCH10_R_2)
        with Locations(Location((16.141592654, 10, 0), (0, 0, 270))):
            Circle(SKETCH10_R_2)
        with Locations(Location((16.141592654, -10, 0), (0, 0, 270))):
            Circle(SKETCH10_R_2)
        with Locations(Location((58.141592654, 10, 0), (0, 0, 270))):
            Circle(SKETCH10_R_2)
        with Locations(Location((58.141592654, -10, 0), (0, 0, 270))):
            Circle(SKETCH10_R_2)
        with Locations(Location((100.141592654, 10, 0), (0, 0, 270))):
            Circle(SKETCH10_R_2)
        with Locations(Location((108.141592654, 10, 0), (0, 0, 270))):
            Circle(SKETCH10_R_2)
        with Locations(Location((100.141592654, -10, 0), (0, 0, 270))):
            Circle(SKETCH10_R_2)
        with Locations(Location((108.141592654, -10, 0), (0, 0, 270))):
            Circle(SKETCH10_R_2)
        with Locations((37.141592654, 0)):
            Rectangle(SKETCH10_W, SKETCH10_H)
        with Locations((79.141592654, 0)):
            Rectangle(SKETCH10_W, SKETCH10_H)
    extrude(amount=-CUT_EXTRUDE1_DEPTH, mode=Mode.SUBTRACT)

    # Fillet2
    fillet2_edges = [part.edges().sort_by_distance(p)[0] for p in [
        (97.141592654, -0.5, -6),
        (97.141592654, -0.5, 6),
        (61.141592654, -0.5, 6),
        (61.141592654, -0.5, -6),
        (55.141592654, -0.5, -6),
        (55.141592654, -0.5, 6),
        (19.141592654, -0.5, 6),
        (19.141592654, -0.5, -6),
    ]]
    fillet(fillet2_edges, radius=FILLET2_R)

    # Fold1: read off the stored shape, not the designer's step
    # Fold1 outline → Fold1 (cut)
    with BuildSketch(Plane.YZ.offset(FOLD1_START)):
        with Locations((-0.5, 0)):
            Rectangle(FOLD1_OUTLINE_W, FOLD1_OUTLINE_H)
    extrude(amount=FOLD1_DEPTH, mode=Mode.SUBTRACT)

    # Fold1 2 outline → Fold1 2 (add)
    with BuildSketch(Plane.YZ.offset(FOLD1_START_2)):
        with BuildLine():
            Line((10, -6), (0, -6))
            Line((0, -6), (0, -15))
            Line((0, -15), (24, -15))
            ThreePointArc((24, -15), (27.535533906, -13.535533906), (29, -10))
            Line((29, -10), (29, 10))
            ThreePointArc((29, 10), (27.535533906, 13.535533906), (24, 15))
            Line((24, 15), (0, 15))
            Line((0, 15), (0, 6))
            Line((0, 6), (10, 6))
            ThreePointArc((10, 6), (12.121320344, 5.121320344), (13, 3))
            Line((13, 3), (13, -3))
            ThreePointArc((13, -3), (12.121320344, -5.121320344), (10, -6))
        make_face()
        with Locations((16, -10)):
            Circle(FOLD1_2_OUTLINE_R, mode=Mode.SUBTRACT)
        with Locations((24, -10)):
            Circle(FOLD1_2_OUTLINE_R, mode=Mode.SUBTRACT)
        with Locations((16, 10)):
            Circle(FOLD1_2_OUTLINE_R, mode=Mode.SUBTRACT)
        with Locations((24, 10)):
            Circle(FOLD1_2_OUTLINE_R, mode=Mode.SUBTRACT)
    extrude(amount=FOLD1_2_DEPTH)

    # Fold1 3 outline → Fold1 3 (cut)
    with BuildSketch(Plane.XY.offset(FOLD1_START_3)):
        with BuildLine():
            Line((84, 29), (82.5, 29))
            Line((82.5, 29), (82.5, 0))
            ThreePointArc((82.5, 0), (83.560660172, 0.439339828), (84, 1.5))
            Line((84, 1.5), (84, 29))
        make_face()
        with BuildLine():
            Line((85, 0), (85, 1.5))
            ThreePointArc((85, 1.5), (84.267766953, -0.267766953), (82.5, -1))
            Line((82.5, -1), (84.74315, -1))
            Line((84.74315, -1), (84.74315, 0))
            Line((84.74315, 0), (85, 0))
        make_face()
    extrude(amount=FOLD1_3_DEPTH, mode=Mode.SUBTRACT)


solid = part.part
